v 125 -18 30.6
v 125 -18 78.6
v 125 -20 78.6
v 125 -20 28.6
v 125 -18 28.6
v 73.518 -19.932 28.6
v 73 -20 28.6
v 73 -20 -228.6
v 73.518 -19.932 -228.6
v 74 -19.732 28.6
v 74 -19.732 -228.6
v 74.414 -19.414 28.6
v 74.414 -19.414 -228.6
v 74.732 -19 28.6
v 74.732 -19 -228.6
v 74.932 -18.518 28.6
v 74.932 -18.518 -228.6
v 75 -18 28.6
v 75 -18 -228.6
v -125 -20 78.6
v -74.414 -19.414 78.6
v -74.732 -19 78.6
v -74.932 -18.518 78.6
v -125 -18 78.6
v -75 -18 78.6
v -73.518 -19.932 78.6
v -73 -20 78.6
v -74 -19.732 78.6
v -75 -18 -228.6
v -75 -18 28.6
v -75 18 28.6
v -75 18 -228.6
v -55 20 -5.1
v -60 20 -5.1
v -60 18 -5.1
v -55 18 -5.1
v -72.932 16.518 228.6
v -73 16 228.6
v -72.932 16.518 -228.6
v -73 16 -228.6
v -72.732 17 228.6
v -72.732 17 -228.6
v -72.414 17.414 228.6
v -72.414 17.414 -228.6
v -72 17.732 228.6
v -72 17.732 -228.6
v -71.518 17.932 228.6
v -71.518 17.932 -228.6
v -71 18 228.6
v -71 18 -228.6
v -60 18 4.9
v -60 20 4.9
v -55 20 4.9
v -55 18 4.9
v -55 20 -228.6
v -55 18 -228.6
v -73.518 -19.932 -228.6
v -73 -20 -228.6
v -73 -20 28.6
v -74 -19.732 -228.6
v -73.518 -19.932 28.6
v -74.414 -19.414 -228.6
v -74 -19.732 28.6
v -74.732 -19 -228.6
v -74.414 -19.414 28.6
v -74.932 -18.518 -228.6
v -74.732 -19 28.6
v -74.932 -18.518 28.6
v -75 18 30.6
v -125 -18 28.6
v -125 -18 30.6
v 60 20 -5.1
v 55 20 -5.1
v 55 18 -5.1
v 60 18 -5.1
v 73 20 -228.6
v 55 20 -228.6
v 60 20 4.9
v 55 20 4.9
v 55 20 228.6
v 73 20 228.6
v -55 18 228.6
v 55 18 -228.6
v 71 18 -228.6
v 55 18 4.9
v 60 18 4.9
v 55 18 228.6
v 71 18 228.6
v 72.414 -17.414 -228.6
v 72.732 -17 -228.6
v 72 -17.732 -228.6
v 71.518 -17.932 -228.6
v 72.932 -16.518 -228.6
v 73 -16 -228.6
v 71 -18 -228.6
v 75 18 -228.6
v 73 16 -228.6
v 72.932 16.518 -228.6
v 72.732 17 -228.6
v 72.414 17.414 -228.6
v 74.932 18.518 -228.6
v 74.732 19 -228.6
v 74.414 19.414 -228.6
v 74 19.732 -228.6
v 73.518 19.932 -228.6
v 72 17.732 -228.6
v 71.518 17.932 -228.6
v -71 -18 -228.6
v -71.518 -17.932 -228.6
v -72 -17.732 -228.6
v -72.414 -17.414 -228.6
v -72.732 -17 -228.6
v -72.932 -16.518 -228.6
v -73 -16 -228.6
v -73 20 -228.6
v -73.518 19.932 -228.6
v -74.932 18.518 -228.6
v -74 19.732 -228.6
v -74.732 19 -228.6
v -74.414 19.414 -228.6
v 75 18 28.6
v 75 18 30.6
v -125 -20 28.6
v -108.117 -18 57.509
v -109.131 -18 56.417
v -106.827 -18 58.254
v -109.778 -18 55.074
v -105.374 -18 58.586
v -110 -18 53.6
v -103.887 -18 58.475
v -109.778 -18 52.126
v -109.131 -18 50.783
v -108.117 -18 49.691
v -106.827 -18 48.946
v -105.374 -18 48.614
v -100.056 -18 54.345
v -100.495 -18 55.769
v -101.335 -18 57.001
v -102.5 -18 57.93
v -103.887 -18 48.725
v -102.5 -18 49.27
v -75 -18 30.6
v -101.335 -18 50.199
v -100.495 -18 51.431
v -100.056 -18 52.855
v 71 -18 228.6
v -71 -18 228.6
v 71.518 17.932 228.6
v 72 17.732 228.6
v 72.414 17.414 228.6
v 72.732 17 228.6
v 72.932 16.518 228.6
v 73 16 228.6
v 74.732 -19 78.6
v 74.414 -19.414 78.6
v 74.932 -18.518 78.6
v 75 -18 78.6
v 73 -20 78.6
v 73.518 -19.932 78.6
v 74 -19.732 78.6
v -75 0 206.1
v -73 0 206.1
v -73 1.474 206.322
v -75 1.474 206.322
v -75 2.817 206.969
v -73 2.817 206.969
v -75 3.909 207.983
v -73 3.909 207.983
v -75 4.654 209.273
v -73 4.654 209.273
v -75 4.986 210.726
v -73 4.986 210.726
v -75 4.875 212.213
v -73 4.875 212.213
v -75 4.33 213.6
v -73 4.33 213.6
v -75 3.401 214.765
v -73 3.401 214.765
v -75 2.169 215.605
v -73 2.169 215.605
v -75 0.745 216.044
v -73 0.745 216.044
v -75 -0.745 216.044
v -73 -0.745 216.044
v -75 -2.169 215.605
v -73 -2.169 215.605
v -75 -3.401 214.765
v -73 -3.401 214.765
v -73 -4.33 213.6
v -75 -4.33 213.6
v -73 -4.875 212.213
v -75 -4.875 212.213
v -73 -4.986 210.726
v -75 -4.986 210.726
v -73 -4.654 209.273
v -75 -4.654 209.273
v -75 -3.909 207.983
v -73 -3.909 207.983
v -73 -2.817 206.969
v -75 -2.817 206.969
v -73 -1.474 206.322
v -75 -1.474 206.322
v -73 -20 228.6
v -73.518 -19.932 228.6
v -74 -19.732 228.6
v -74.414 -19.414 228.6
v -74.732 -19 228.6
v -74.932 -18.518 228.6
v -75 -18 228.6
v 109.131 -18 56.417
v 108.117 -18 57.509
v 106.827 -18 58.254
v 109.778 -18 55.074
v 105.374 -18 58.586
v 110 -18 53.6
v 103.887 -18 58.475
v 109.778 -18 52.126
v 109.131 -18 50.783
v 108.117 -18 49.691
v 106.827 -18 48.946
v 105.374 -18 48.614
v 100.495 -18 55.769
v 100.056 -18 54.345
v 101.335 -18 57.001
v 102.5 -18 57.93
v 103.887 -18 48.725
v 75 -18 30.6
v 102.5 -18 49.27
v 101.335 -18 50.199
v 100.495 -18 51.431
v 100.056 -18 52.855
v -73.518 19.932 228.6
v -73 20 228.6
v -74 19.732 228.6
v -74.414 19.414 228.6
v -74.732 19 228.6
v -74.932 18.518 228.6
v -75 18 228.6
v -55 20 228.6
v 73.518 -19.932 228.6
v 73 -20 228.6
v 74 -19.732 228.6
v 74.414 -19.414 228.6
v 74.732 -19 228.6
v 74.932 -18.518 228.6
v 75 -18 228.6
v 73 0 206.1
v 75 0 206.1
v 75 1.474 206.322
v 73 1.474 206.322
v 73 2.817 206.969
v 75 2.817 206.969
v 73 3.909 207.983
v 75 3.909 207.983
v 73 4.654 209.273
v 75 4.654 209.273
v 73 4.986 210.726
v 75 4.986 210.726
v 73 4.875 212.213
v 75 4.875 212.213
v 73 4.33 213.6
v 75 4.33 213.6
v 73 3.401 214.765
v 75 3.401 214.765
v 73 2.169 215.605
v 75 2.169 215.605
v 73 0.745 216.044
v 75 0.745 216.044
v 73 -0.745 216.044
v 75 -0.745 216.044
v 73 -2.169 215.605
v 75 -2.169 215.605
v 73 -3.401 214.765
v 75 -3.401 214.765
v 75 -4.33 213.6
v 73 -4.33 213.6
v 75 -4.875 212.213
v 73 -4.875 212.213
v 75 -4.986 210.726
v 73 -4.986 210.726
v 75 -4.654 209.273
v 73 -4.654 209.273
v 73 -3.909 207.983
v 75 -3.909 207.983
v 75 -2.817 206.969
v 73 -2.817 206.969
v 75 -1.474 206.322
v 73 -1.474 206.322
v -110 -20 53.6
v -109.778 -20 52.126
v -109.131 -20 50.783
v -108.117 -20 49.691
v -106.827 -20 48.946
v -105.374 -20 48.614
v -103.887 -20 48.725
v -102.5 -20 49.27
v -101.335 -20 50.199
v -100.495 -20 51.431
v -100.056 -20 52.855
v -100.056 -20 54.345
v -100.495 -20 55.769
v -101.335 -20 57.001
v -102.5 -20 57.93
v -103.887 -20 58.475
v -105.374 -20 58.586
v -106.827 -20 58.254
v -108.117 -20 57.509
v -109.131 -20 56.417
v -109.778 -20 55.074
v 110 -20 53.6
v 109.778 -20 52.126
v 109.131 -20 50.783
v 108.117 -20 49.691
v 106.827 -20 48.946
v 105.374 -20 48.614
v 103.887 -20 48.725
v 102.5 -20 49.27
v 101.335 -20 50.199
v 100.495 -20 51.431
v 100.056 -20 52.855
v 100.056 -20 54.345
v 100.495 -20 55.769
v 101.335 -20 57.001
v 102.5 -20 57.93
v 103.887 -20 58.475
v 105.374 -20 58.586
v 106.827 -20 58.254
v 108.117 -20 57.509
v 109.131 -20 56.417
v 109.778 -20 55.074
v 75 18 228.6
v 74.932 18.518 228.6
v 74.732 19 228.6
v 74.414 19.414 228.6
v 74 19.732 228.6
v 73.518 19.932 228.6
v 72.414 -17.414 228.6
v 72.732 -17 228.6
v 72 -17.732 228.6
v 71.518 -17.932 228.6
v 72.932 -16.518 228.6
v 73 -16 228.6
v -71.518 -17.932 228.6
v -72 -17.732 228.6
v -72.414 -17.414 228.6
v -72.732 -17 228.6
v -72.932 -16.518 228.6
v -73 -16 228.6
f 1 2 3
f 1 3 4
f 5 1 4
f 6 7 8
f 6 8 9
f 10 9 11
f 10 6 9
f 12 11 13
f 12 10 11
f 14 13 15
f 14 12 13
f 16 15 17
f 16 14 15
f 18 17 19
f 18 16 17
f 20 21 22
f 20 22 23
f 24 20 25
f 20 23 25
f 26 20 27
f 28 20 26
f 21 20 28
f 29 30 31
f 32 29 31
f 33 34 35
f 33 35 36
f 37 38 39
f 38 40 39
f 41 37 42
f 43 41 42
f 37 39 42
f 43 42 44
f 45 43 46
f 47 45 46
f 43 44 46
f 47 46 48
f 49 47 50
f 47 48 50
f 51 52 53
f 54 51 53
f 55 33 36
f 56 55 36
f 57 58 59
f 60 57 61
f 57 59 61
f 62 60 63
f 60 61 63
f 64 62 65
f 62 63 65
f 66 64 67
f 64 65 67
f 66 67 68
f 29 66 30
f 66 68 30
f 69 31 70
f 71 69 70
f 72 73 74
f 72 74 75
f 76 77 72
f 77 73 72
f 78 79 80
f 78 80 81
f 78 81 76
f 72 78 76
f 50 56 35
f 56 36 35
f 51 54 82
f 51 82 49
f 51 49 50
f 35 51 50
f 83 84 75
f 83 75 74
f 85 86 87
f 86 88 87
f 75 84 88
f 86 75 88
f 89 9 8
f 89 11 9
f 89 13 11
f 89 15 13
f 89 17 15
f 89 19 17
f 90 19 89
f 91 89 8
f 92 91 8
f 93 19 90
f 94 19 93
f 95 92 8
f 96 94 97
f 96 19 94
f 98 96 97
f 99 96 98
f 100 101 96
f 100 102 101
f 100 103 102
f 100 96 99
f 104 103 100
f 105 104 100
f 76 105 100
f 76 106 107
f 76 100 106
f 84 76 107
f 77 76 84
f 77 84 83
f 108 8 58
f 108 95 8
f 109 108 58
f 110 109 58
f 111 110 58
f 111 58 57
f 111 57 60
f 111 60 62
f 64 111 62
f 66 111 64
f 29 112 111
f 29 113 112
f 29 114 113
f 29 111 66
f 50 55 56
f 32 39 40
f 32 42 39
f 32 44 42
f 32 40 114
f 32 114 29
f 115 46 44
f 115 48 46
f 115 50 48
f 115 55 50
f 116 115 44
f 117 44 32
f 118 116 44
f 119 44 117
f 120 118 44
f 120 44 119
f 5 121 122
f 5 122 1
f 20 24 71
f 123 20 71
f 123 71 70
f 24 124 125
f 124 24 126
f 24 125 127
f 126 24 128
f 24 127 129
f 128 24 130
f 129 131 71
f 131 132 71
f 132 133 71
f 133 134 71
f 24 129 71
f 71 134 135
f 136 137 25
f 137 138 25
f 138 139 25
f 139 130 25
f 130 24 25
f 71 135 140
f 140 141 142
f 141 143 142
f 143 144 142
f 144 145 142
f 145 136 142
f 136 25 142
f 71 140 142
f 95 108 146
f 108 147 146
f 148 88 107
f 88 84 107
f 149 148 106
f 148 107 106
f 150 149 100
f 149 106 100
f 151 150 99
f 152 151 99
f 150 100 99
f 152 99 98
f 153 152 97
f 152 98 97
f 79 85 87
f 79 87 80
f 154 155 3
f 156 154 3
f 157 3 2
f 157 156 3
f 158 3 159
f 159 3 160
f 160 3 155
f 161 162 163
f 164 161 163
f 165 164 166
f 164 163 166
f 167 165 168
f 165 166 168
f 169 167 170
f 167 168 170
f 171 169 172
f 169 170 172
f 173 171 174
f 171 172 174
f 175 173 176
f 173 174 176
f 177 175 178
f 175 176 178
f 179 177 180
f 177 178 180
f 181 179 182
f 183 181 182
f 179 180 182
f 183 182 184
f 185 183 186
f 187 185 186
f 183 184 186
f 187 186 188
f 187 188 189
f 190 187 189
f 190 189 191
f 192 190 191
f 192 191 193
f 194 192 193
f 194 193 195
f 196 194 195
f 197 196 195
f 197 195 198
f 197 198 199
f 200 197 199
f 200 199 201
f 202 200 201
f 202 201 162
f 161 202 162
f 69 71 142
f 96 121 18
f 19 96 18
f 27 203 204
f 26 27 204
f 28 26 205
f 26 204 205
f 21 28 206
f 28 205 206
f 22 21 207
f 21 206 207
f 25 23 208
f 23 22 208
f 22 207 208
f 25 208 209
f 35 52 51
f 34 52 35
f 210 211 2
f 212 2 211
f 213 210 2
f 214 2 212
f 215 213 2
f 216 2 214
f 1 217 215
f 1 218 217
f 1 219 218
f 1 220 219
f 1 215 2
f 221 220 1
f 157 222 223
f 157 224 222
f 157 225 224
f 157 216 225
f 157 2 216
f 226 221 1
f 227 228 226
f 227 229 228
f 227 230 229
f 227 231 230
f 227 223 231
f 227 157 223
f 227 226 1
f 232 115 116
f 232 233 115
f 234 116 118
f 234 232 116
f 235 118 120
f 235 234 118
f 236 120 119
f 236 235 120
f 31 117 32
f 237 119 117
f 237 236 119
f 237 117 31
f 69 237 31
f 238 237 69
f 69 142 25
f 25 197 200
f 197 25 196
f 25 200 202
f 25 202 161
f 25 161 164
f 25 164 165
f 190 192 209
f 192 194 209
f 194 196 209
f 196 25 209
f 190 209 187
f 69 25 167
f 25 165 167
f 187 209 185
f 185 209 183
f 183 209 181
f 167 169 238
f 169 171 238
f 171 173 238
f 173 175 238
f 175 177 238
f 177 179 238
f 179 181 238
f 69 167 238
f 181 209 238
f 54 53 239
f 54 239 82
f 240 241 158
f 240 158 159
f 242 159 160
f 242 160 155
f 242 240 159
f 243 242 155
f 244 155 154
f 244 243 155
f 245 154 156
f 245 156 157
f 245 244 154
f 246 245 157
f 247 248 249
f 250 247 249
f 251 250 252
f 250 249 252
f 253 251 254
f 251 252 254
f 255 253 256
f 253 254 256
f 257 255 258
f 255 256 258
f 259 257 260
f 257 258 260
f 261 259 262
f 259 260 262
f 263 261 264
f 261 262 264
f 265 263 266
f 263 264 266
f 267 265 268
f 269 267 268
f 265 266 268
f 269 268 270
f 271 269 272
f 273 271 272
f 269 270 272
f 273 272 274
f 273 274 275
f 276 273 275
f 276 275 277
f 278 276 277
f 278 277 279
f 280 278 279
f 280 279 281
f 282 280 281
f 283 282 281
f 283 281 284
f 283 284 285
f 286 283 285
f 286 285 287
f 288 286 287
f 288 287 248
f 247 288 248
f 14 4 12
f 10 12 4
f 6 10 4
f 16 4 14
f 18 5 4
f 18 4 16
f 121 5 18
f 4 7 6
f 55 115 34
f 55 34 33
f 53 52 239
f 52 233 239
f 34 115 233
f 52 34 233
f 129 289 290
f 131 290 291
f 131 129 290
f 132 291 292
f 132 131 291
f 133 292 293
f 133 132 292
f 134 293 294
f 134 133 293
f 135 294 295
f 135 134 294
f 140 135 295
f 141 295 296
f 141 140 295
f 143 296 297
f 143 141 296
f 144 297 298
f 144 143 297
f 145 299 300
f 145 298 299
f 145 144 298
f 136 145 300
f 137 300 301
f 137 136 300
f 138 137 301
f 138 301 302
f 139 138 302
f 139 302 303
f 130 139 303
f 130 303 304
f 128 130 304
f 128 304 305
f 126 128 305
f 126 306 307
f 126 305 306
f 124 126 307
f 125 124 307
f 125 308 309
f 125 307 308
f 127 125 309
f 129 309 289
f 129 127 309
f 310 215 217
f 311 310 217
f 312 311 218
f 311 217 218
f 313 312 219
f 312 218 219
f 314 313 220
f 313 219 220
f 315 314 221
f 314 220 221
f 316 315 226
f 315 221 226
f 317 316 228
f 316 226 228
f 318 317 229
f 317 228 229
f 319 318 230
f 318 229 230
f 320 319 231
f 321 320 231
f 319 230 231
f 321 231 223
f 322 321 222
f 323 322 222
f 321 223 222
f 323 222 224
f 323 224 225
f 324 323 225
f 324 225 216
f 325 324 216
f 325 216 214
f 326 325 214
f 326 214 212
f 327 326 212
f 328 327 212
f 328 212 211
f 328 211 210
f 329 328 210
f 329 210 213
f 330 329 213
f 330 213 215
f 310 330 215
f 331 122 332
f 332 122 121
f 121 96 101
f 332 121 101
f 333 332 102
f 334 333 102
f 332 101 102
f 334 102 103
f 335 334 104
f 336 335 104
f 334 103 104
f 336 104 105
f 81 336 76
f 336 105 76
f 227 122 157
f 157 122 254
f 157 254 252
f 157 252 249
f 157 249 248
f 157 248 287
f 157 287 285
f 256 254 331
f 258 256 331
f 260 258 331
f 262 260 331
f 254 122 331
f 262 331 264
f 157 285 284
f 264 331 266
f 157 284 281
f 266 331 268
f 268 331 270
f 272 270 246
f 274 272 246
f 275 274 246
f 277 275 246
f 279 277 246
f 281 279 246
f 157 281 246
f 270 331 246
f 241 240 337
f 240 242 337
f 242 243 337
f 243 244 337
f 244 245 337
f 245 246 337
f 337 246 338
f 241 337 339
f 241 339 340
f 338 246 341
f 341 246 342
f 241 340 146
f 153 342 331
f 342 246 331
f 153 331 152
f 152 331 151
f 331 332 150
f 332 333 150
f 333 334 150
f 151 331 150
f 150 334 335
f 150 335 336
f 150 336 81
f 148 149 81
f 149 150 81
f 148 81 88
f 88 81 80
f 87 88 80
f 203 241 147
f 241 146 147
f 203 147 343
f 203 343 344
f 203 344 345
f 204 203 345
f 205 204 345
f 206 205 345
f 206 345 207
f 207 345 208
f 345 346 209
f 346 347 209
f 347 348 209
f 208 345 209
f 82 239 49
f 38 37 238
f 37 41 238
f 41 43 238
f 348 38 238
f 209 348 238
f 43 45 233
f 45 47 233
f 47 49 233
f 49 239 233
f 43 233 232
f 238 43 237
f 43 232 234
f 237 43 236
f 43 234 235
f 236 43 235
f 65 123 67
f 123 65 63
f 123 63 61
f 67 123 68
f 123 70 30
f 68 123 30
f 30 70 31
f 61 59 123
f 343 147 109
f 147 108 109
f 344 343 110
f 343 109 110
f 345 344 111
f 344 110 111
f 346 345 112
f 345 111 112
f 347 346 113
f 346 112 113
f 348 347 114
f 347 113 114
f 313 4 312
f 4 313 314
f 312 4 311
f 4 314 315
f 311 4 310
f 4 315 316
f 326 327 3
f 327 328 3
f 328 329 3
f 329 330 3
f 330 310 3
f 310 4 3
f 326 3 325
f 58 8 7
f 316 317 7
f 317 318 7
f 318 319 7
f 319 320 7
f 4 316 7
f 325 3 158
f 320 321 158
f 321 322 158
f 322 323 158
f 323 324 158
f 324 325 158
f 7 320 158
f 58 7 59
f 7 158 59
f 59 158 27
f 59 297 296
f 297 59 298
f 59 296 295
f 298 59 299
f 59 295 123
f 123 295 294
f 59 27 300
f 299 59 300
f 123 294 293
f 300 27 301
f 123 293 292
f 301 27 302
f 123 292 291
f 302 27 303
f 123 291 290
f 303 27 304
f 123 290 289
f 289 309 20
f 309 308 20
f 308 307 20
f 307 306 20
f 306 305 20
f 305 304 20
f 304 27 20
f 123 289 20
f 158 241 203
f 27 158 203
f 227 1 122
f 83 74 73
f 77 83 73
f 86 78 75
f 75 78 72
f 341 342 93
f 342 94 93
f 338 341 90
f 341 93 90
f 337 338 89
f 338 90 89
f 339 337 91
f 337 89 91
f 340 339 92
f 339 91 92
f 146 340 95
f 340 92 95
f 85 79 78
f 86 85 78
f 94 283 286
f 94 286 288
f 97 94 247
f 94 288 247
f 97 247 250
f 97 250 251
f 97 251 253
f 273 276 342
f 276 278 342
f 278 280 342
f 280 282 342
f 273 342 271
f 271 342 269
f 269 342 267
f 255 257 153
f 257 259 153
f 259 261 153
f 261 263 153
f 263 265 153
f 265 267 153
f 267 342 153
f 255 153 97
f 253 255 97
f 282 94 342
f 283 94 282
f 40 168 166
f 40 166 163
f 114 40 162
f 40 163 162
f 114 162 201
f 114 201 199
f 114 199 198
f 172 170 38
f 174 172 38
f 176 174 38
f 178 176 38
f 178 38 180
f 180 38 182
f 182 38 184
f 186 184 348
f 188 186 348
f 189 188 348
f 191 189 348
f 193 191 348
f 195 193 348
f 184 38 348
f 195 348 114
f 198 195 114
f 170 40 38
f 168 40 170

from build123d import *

# Parameters (mm, degrees)
SALIENTE_EXTRUIR2_DEPTH = 228.6
REDONDEO1_R             = 2
CROQUIS3_R              = 5
CORTAR_EXTRUIR1_DEPTH   = 151
SALIENTE_EXTRUIR3_START = -3
CROQUIS5_W              = 50
CROQUIS5_H              = 2
SALIENTE_EXTRUIR3_DEPTH = 53
CROQUIS6_R              = 5
CORTAR_EXTRUIR2_DEPTH   = 50
SALIENTE_EXTRUIR4_DEPTH = 2
CROQUIS8_W              = 5
CROQUIS8_H              = 10
CORTAR_EXTRUIR3_DEPTH   = 10


with BuildPart() as part:
    # Croquis2 → Saliente-Extruir2 (new body, symmetric)
    with BuildSketch(Plane.XY):
        Polygon((-75, 20), (-55, 20), (-55, 18), (-73, 18), (-73, -18), (73, -18), (73, 18), (55, 18), (55, 20), (75, 20), (75, -20), (-75, -20), align=None)
    extrude(amount=SALIENTE_EXTRUIR2_DEPTH, both=True)

    # Redondeo1
    redondeo1_edges = [part.edges().sort_by_distance(p)[0] for p in [
        (75, 20, 0),
        (75, -20, 0),
        (-75, -20, 0),
        (-75, 20, 0),
        (-73, 18, 0),
        (-73, -18, 0),
        (73, -18, 0),
        (73, 18, 0),
    ]]
    fillet(redondeo1_edges, radius=REDONDEO1_R)

    # Croquis3 → Cortar-Extruir1 (cut, through all)
    with BuildSketch(Plane(origin=(75, 0, 0), x_dir=(0, 0, -1), z_dir=(1, 0, 0))):
        with Locations((-211.1, 0)):
            Circle(CROQUIS3_R)
    extrude(amount=-CORTAR_EXTRUIR1_DEPTH, mode=Mode.SUBTRACT)

    # Croquis5 → Saliente-Extruir3 (add)
    with BuildSketch(Plane(origin=(75, 0, 0), x_dir=(0, 0, -1), z_dir=(1, 0, 0)).offset(SALIENTE_EXTRUIR3_START)):
        with Locations((-53.6, -19)):
            Rectangle(CROQUIS5_W, CROQUIS5_H)
    saliente_extruir3 = extrude(amount=SALIENTE_EXTRUIR3_DEPTH)

    # Croquis6 → Cortar-Extruir2 (cut)
    with BuildSketch(Plane(origin=(0, -18, 0), x_dir=(1, 0, 0), z_dir=(0, 1, 0))):
        with Locations((105, -53.6)):
            Circle(CROQUIS6_R)
    cortar_extruir2 = extrude(amount=-CORTAR_EXTRUIR2_DEPTH, mode=Mode.SUBTRACT)

    # Croquis7 → Saliente-Extruir4 (add)
    with BuildSketch(Plane(origin=(0, 0, 28.6), x_dir=(-1, 0, 0), z_dir=(0, 0, -1))):
        Polygon((-75, -18), (-75, 18), (-125, -18), align=None)
    saliente_extruir4 = extrude(amount=-SALIENTE_EXTRUIR4_DEPTH)

    # Simetría1: Saliente-Extruir3, Cortar-Extruir2, Saliente-Extruir4 across plane
    add(saliente_extruir3.mirror(Plane(origin=(0, 0, 0), x_dir=(0, 0, 1), z_dir=(1, 0, 0))))
    add(cortar_extruir2.mirror(Plane(origin=(0, 0, 0), x_dir=(0, 0, 1), z_dir=(1, 0, 0))), mode=Mode.SUBTRACT)
    add(saliente_extruir4.mirror(Plane(origin=(0, 0, 0), x_dir=(0, 0, 1), z_dir=(1, 0, 0))))

    # Croquis8 → Cortar-Extruir3 (cut)
    with BuildSketch(Plane(origin=(0, 20, 0), x_dir=(1, 0, 0), z_dir=(0, 1, 0))):
        with Locations((-57.5, 0.1)):
            Rectangle(CROQUIS8_W, CROQUIS8_H)
        with Locations((57.5, 0.1)):
            Rectangle(CROQUIS8_W, CROQUIS8_H)
    extrude(amount=-CORTAR_EXTRUIR3_DEPTH, mode=Mode.SUBTRACT)


solid = part.part
